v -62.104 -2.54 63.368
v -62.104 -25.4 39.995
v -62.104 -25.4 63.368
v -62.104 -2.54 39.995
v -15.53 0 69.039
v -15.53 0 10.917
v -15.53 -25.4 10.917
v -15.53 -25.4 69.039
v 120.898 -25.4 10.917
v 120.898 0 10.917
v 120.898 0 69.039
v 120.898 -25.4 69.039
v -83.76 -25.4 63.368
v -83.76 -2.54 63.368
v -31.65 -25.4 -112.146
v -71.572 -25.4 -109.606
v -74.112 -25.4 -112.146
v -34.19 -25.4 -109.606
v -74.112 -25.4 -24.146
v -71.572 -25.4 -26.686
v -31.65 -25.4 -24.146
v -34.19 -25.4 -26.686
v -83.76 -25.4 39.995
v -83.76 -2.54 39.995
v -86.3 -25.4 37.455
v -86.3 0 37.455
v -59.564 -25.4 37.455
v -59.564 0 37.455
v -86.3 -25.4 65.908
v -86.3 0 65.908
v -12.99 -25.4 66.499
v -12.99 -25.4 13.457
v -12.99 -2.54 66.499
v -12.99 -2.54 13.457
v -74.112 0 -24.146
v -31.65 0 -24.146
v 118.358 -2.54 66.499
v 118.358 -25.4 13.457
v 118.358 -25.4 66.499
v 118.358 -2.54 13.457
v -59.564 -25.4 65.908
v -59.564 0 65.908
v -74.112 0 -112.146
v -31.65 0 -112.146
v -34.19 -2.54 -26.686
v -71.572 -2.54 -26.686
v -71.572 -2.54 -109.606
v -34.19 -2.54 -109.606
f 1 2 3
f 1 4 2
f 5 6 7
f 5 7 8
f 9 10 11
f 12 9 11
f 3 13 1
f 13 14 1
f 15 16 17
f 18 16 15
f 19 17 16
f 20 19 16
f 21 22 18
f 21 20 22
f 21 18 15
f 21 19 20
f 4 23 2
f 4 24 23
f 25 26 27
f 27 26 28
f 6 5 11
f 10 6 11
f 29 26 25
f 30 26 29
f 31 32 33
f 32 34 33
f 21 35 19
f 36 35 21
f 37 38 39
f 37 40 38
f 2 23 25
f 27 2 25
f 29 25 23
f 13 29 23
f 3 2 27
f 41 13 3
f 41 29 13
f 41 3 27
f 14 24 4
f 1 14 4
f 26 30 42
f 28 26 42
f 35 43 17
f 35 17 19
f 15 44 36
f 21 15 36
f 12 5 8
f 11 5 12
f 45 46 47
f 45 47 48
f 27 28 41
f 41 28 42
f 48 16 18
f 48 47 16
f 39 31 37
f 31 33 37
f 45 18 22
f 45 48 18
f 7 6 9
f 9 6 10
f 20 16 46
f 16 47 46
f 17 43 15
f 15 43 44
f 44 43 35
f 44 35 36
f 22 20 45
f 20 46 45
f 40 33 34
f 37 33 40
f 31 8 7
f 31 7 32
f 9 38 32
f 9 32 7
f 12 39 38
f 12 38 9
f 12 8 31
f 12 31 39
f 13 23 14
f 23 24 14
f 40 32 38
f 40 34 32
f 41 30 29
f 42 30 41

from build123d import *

# Parameters (mm, degrees)
F0_W     = 26.7351791263
F0_H     = 28.4533537924
F1_DEPTH = 25.4
F0_W_2   = 136.4281037822
F0_H_2   = 58.1214046106
F0_W_3   = 42.4617677927
F0_H_3   = 87.9993084818
F2_T     = -2.54
F2_2_T   = -2.54
F2_3_T   = -2.54


with BuildPart() as f1:
    # F0 (on Front) → F1 (new body)
    with BuildSketch(Plane.XZ):
        with Locations((-72.932023555, 51.6817774624)):
            Rectangle(F0_W, F0_H)
    extrude(amount=F1_DEPTH)

    # F2
    f2_openings = [f1.faces().sort_by_distance(p)[0] for p in [
        (-72.932024, -25.4, 51.681777),
    ]]
    offset(amount=F2_T, openings=f2_openings)


with BuildPart() as f1b:
    # F0 (on Front) → F1, piece 2 (new body)
    with BuildSketch(Plane.XZ):
        with Locations((52.684053313, 39.9779421277)):
            Rectangle(F0_W_2, F0_H_2)
    extrude(amount=F1_DEPTH)

    # F2#2
    f2_2_openings = [f1b.faces().sort_by_distance(p)[0] for p in [
        (52.684053, -25.4, 39.977942),
    ]]
    offset(amount=F2_2_T, openings=f2_2_openings)


with BuildPart() as f1c:
    # F0 (on Front) → F1, piece 3 (new body)
    with BuildSketch(Plane.XZ):
        with Locations((-52.8806298971, -68.1459559128)):
            Rectangle(F0_W_3, F0_H_3)
    extrude(amount=F1_DEPTH)

    # F2#3
    f2_3_openings = [f1c.faces().sort_by_distance(p)[0] for p in [
        (-52.88063, -25.4, -68.145956),
    ]]
    offset(amount=F2_3_T, openings=f2_3_openings)


solid = Compound([f1.part, f1b.part, f1c.part])
